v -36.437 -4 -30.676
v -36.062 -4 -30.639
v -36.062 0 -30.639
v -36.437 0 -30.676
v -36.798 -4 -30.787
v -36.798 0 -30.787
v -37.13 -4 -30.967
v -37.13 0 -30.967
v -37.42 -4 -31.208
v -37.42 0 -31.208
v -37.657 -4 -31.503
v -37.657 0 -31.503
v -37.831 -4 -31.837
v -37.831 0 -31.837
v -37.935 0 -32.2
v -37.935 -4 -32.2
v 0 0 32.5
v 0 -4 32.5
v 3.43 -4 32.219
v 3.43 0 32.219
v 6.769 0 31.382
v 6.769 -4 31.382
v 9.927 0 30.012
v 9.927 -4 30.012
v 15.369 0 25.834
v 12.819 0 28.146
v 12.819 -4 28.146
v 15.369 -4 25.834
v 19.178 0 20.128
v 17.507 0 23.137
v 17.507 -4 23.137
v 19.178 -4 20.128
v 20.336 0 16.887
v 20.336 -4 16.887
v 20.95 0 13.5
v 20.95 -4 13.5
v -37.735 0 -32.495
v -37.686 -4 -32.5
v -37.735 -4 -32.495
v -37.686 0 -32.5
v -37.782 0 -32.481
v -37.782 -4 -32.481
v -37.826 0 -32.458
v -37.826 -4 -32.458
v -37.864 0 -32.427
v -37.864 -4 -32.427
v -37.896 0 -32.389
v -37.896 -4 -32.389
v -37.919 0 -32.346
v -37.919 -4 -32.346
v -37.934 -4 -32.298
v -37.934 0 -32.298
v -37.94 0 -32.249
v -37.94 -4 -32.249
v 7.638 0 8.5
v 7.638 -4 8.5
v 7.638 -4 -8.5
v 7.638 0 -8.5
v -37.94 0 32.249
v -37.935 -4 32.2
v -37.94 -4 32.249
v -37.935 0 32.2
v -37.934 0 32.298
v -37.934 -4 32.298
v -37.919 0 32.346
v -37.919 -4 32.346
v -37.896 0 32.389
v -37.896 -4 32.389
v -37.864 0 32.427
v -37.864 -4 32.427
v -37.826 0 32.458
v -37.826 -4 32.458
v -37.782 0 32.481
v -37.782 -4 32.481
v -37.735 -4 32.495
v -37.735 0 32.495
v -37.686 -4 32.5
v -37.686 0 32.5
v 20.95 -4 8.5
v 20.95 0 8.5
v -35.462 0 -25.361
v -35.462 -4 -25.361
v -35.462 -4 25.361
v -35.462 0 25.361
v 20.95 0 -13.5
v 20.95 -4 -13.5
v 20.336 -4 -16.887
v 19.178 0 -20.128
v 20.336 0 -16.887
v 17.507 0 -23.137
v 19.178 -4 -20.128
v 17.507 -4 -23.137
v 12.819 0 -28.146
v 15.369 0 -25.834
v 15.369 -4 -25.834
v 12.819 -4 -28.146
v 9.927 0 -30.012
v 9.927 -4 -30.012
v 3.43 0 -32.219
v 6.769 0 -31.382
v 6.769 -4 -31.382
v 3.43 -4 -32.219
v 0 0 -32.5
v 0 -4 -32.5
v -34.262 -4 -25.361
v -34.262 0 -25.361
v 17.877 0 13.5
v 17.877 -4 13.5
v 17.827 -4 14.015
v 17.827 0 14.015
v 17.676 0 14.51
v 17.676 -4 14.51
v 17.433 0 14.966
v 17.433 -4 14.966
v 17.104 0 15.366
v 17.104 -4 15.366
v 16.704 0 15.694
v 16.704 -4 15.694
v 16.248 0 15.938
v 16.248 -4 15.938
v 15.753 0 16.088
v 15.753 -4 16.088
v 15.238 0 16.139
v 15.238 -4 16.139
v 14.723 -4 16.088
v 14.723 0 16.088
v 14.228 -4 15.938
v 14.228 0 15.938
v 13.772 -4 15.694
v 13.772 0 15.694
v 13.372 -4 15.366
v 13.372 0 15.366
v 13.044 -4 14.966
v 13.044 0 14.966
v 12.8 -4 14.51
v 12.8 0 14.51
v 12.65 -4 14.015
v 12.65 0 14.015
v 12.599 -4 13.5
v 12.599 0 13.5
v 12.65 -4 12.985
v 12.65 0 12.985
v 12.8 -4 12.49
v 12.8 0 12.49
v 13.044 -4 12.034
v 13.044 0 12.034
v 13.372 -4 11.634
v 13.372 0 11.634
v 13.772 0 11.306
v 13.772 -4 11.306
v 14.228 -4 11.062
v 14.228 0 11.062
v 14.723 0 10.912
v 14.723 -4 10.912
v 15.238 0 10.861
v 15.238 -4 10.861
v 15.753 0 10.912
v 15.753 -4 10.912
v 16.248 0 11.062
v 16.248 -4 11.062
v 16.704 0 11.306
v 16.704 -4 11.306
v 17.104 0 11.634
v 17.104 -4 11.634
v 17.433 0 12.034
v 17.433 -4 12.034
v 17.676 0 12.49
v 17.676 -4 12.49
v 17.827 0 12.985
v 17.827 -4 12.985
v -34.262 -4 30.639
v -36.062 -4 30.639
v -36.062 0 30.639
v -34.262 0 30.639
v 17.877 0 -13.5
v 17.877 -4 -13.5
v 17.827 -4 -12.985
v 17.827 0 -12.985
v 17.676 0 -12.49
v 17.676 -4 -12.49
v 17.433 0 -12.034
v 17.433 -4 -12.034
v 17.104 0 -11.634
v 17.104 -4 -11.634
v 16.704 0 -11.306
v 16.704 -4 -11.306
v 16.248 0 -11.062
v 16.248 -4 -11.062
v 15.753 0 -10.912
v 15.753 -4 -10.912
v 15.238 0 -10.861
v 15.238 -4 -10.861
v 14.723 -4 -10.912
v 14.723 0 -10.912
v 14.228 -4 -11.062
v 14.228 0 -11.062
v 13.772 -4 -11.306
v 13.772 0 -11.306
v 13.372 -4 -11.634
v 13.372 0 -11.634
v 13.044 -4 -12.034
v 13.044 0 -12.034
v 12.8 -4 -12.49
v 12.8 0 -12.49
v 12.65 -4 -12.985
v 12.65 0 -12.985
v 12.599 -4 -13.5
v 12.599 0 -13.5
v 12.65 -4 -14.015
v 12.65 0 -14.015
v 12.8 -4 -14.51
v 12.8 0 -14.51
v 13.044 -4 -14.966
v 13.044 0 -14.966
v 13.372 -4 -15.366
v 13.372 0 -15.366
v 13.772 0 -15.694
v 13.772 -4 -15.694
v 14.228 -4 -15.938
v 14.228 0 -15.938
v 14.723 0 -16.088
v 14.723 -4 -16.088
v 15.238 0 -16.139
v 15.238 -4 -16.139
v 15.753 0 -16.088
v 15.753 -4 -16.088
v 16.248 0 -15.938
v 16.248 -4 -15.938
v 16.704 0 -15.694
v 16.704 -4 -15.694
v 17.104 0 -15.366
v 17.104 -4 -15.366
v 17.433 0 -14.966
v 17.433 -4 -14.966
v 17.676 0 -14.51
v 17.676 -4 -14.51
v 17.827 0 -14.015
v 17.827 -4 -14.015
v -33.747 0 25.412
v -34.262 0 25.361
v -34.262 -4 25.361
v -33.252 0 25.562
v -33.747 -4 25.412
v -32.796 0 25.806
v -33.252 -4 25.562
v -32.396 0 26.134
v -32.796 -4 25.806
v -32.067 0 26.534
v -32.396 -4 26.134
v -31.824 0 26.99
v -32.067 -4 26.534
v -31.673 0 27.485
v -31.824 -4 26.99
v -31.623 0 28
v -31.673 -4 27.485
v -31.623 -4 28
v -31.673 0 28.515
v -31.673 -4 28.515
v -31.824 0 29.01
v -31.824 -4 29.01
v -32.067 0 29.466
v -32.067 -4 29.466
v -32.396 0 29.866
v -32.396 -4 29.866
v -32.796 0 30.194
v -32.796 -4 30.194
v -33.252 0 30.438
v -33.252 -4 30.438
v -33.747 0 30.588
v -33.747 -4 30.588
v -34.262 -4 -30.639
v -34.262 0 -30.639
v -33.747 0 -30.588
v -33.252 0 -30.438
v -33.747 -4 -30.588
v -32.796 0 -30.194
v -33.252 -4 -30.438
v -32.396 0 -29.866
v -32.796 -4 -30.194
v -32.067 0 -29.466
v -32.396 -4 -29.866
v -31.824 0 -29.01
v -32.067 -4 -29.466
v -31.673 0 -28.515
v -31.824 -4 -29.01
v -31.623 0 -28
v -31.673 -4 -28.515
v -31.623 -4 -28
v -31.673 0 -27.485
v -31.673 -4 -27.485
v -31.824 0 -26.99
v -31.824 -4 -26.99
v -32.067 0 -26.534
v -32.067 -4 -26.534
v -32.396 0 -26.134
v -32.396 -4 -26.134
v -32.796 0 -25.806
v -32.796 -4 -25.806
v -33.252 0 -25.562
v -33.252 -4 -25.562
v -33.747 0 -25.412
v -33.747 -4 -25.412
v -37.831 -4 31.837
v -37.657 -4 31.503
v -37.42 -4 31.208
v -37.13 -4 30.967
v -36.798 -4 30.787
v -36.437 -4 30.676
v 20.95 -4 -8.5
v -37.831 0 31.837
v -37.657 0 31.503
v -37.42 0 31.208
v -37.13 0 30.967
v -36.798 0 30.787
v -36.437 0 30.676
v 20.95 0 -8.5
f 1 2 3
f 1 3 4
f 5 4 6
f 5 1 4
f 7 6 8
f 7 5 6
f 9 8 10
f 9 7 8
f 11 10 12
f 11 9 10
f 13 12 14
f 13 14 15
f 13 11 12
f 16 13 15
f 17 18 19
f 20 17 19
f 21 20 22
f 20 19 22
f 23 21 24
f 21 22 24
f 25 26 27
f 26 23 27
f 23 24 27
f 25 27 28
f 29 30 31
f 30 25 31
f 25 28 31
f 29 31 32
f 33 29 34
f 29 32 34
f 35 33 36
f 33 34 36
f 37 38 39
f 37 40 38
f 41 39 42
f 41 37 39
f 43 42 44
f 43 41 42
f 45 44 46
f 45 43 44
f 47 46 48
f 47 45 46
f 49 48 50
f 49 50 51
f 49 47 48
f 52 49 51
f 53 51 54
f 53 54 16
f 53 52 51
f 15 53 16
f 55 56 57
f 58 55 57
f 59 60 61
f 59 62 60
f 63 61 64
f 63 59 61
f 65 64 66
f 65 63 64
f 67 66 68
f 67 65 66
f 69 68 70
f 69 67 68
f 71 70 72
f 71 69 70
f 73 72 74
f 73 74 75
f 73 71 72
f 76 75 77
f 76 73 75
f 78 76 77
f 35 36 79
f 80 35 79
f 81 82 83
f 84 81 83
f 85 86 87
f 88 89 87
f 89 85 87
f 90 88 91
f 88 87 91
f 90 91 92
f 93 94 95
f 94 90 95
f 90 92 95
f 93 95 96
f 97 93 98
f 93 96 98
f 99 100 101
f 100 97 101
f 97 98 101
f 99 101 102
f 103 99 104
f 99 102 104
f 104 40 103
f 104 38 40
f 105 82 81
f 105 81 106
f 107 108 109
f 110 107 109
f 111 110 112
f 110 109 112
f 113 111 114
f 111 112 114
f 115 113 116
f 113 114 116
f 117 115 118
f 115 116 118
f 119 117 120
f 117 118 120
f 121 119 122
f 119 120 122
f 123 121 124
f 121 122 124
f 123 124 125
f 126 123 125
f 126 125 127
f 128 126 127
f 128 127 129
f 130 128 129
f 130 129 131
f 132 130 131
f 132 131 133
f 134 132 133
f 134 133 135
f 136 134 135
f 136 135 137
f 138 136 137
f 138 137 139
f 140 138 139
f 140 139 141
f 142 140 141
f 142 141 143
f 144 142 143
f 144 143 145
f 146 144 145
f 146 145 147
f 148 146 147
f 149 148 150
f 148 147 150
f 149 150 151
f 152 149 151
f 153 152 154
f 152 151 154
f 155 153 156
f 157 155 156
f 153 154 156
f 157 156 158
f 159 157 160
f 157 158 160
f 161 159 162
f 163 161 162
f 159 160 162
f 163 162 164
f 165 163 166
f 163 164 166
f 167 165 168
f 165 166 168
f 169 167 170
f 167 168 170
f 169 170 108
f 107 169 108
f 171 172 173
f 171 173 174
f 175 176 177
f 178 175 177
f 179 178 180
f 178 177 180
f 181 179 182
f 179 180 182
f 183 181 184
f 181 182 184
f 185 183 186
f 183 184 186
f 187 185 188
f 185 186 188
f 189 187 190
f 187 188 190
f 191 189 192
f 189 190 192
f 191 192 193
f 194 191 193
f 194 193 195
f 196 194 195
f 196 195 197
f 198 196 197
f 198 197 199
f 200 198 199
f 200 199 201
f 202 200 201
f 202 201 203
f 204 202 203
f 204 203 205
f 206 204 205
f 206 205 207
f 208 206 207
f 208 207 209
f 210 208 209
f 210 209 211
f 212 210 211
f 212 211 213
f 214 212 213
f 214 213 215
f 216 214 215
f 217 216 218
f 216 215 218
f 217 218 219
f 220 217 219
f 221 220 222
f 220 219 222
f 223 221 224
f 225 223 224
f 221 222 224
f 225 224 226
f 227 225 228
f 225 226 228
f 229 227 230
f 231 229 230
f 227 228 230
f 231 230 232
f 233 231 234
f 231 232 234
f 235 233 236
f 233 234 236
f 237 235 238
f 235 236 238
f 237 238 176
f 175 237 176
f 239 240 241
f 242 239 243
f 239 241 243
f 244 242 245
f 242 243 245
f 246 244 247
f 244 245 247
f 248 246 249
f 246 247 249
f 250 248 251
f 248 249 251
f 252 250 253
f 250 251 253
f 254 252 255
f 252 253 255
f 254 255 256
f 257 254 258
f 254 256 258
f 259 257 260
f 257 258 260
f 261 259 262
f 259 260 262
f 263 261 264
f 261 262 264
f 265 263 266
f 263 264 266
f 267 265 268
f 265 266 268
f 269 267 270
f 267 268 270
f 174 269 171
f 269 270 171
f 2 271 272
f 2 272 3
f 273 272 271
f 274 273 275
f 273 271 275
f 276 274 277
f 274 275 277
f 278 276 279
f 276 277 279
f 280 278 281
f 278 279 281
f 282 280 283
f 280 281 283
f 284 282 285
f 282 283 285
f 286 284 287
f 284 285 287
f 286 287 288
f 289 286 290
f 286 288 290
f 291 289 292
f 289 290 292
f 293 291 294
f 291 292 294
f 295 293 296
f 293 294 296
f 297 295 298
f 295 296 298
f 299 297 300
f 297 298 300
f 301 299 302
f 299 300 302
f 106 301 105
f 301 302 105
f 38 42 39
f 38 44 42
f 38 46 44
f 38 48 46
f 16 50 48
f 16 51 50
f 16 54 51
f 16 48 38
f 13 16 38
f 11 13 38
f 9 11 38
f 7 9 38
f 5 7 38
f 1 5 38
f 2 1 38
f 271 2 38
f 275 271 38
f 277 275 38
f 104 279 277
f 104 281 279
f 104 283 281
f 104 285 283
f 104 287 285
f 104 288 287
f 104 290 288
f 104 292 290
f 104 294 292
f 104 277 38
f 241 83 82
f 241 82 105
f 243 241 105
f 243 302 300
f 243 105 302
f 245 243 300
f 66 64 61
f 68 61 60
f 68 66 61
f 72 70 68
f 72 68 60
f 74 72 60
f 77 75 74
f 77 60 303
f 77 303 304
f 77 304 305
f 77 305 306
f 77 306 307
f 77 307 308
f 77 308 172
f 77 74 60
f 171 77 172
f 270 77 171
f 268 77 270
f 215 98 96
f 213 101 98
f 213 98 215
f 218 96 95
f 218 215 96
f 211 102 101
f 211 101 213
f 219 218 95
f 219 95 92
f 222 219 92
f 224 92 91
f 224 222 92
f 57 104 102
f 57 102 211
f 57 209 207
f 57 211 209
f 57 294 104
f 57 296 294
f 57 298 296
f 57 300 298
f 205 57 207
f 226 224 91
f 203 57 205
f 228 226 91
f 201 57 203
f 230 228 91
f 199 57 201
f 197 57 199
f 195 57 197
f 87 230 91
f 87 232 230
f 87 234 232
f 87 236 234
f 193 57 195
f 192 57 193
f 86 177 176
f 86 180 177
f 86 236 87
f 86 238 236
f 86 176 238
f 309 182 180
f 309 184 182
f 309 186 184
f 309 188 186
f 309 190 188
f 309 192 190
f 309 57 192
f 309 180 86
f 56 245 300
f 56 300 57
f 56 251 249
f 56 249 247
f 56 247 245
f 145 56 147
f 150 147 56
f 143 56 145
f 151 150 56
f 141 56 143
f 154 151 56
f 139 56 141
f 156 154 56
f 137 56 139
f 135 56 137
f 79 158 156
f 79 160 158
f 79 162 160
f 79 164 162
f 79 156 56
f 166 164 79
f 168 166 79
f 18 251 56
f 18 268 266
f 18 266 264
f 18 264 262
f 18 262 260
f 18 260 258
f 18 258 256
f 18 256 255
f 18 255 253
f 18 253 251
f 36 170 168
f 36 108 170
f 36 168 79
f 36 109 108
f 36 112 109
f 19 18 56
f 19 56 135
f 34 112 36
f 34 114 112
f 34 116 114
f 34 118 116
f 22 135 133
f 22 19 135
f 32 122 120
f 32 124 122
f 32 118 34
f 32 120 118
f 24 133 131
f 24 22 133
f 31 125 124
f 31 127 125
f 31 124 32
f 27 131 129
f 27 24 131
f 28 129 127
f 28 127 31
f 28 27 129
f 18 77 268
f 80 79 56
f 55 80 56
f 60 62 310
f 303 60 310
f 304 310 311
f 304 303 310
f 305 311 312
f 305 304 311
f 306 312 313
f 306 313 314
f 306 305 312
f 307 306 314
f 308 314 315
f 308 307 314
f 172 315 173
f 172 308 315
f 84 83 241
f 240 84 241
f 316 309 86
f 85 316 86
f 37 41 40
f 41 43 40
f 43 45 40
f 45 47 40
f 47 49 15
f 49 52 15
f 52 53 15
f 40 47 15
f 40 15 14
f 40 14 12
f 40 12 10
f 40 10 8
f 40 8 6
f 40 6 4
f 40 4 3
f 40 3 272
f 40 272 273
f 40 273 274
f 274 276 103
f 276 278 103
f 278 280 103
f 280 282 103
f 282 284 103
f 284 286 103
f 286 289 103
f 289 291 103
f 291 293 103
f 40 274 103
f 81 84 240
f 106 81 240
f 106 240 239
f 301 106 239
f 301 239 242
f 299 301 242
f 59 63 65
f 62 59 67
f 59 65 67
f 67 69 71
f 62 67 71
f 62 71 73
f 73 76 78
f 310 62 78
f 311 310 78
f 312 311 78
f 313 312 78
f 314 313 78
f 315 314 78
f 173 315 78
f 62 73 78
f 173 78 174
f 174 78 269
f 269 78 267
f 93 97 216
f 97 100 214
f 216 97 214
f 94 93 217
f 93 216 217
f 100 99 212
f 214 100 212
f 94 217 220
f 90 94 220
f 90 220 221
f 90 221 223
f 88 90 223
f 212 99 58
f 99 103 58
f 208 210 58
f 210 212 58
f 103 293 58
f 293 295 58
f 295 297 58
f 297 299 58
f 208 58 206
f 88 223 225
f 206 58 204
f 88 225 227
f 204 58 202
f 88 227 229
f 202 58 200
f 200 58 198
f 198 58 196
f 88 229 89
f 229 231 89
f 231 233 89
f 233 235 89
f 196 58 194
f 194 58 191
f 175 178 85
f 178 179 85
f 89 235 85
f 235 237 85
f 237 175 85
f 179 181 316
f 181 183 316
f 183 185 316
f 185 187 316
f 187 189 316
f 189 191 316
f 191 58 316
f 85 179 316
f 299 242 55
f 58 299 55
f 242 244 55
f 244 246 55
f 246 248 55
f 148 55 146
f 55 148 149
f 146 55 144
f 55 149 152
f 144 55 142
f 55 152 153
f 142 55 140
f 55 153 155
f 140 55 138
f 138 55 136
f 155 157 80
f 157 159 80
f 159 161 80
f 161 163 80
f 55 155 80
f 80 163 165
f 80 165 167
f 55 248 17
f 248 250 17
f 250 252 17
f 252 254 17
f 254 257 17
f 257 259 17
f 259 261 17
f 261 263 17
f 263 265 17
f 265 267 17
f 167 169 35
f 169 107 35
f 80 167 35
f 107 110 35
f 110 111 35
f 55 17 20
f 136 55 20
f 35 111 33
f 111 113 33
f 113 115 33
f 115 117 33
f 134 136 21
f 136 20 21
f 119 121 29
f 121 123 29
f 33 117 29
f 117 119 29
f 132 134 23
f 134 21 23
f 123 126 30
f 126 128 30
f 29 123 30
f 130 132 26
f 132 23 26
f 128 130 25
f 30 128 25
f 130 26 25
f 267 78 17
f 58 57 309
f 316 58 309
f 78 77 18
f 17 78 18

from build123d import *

# Parameters (mm, degrees)
F0_W     = 68.523422
F0_H     = 74.860842
F1_DEPTH = 4
F2_R     = 2.63906
F3_DEPTH = 4.001
F4_W     = 1.2
F4_H     = 50.72188
F5_DEPTH = 4
F6_R     = 0.254


with BuildPart() as f1:
    # F0 (on Front) → F1 (new body)
    with BuildSketch(Plane.XZ):
        Rectangle(F0_W, F0_H)
    extrude(amount=F1_DEPTH)

    # F2 (on face) → F3 (cut, through all)
    with BuildSketch(Plane.XZ.offset(4)):
        with Locations((-34.261711, 28)):
            Circle(F2_R)
        with Locations((15.238289, 13.5)):
            Circle(F2_R)
        with Locations((-34.261711, -28)):
            Circle(F2_R)
        with Locations((15.238289, -13.5)):
            Circle(F2_R)
        with BuildLine():
            Line((20.95, 8.5), (7.638289, 8.5))
            Line((7.638289, 8.5), (7.638289, 0))
            Line((7.638289, 0), (34.261711, 0))
            Line((34.261711, 0), (34.261711, 8.5))
            Line((34.261711, 8.5), (34.261711, 37.430421))
            Line((34.261711, 37.430421), (-34.261711, 37.430421))
            Line((-34.261711, 37.430421), (-34.261711, 32.5))
            Line((-34.261711, 32.5), (0, 32.5))
            ThreePointArc((0, 32.5), (14.141274, 27.042549), (20.95, 13.5))
            Line((20.95, 13.5), (20.95, 8.5))
        make_face()
        with BuildLine():
            Line((34.261711, 0), (7.638289, 0))
            Line((7.638289, 0), (7.638289, -8.5))
            Line((7.638289, -8.5), (20.95, -8.5))
            Line((20.95, -8.5), (20.95, -13.5))
            ThreePointArc((20.95, -13.5), (14.141274, -27.042549), (0, -32.5))
            Line((0, -32.5), (-34.261711, -32.5))
            Line((-34.261711, -32.5), (-34.261711, -37.430421))
            Line((-34.261711, -37.430421), (34.261711, -37.430421))
            Line((34.261711, -37.430421), (34.261711, -8.5))
            Line((34.261711, -8.5), (34.261711, 0))
        make_face()
    extrude(amount=-F3_DEPTH, mode=Mode.SUBTRACT)

    # F4 (on face) → F5 (join, through all)
    with BuildSketch(Plane.XZ.offset(4)):
        with BuildLine():
            Line((-34.261711, -32.5), (-34.261711, -30.63906))
            Line((-34.261711, -30.63906), (-36.061711, -30.63906))
            ThreePointArc((-36.061711, -30.63906), (-37.393081, -31.181533), (-37.966201, -32.5))
            Line((-37.966201, -32.5), (-34.261711, -32.5))
        make_face()
        with Locations((-34.861711, 0)):
            Rectangle(F4_W, F4_H)
        with BuildLine():
            Line((-36.061711, 30.63906), (-34.261711, 30.63906))
            Line((-34.261711, 30.63906), (-34.261711, 32.5))
            Line((-34.261711, 32.5), (-37.966201, 32.5))
            ThreePointArc((-37.966201, 32.5), (-37.393081, 31.181533), (-36.061711, 30.63906))
        make_face()
    extrude(amount=-F5_DEPTH)

    # F6
    f6_edges = [f1.edges().sort_by_distance(p)[0] for p in [
        (-37.966201, -2, -32.5),
        (-37.966201, -2, 32.5),
    ]]
    fillet(f6_edges, radius=F6_R)


solid = f1.part
